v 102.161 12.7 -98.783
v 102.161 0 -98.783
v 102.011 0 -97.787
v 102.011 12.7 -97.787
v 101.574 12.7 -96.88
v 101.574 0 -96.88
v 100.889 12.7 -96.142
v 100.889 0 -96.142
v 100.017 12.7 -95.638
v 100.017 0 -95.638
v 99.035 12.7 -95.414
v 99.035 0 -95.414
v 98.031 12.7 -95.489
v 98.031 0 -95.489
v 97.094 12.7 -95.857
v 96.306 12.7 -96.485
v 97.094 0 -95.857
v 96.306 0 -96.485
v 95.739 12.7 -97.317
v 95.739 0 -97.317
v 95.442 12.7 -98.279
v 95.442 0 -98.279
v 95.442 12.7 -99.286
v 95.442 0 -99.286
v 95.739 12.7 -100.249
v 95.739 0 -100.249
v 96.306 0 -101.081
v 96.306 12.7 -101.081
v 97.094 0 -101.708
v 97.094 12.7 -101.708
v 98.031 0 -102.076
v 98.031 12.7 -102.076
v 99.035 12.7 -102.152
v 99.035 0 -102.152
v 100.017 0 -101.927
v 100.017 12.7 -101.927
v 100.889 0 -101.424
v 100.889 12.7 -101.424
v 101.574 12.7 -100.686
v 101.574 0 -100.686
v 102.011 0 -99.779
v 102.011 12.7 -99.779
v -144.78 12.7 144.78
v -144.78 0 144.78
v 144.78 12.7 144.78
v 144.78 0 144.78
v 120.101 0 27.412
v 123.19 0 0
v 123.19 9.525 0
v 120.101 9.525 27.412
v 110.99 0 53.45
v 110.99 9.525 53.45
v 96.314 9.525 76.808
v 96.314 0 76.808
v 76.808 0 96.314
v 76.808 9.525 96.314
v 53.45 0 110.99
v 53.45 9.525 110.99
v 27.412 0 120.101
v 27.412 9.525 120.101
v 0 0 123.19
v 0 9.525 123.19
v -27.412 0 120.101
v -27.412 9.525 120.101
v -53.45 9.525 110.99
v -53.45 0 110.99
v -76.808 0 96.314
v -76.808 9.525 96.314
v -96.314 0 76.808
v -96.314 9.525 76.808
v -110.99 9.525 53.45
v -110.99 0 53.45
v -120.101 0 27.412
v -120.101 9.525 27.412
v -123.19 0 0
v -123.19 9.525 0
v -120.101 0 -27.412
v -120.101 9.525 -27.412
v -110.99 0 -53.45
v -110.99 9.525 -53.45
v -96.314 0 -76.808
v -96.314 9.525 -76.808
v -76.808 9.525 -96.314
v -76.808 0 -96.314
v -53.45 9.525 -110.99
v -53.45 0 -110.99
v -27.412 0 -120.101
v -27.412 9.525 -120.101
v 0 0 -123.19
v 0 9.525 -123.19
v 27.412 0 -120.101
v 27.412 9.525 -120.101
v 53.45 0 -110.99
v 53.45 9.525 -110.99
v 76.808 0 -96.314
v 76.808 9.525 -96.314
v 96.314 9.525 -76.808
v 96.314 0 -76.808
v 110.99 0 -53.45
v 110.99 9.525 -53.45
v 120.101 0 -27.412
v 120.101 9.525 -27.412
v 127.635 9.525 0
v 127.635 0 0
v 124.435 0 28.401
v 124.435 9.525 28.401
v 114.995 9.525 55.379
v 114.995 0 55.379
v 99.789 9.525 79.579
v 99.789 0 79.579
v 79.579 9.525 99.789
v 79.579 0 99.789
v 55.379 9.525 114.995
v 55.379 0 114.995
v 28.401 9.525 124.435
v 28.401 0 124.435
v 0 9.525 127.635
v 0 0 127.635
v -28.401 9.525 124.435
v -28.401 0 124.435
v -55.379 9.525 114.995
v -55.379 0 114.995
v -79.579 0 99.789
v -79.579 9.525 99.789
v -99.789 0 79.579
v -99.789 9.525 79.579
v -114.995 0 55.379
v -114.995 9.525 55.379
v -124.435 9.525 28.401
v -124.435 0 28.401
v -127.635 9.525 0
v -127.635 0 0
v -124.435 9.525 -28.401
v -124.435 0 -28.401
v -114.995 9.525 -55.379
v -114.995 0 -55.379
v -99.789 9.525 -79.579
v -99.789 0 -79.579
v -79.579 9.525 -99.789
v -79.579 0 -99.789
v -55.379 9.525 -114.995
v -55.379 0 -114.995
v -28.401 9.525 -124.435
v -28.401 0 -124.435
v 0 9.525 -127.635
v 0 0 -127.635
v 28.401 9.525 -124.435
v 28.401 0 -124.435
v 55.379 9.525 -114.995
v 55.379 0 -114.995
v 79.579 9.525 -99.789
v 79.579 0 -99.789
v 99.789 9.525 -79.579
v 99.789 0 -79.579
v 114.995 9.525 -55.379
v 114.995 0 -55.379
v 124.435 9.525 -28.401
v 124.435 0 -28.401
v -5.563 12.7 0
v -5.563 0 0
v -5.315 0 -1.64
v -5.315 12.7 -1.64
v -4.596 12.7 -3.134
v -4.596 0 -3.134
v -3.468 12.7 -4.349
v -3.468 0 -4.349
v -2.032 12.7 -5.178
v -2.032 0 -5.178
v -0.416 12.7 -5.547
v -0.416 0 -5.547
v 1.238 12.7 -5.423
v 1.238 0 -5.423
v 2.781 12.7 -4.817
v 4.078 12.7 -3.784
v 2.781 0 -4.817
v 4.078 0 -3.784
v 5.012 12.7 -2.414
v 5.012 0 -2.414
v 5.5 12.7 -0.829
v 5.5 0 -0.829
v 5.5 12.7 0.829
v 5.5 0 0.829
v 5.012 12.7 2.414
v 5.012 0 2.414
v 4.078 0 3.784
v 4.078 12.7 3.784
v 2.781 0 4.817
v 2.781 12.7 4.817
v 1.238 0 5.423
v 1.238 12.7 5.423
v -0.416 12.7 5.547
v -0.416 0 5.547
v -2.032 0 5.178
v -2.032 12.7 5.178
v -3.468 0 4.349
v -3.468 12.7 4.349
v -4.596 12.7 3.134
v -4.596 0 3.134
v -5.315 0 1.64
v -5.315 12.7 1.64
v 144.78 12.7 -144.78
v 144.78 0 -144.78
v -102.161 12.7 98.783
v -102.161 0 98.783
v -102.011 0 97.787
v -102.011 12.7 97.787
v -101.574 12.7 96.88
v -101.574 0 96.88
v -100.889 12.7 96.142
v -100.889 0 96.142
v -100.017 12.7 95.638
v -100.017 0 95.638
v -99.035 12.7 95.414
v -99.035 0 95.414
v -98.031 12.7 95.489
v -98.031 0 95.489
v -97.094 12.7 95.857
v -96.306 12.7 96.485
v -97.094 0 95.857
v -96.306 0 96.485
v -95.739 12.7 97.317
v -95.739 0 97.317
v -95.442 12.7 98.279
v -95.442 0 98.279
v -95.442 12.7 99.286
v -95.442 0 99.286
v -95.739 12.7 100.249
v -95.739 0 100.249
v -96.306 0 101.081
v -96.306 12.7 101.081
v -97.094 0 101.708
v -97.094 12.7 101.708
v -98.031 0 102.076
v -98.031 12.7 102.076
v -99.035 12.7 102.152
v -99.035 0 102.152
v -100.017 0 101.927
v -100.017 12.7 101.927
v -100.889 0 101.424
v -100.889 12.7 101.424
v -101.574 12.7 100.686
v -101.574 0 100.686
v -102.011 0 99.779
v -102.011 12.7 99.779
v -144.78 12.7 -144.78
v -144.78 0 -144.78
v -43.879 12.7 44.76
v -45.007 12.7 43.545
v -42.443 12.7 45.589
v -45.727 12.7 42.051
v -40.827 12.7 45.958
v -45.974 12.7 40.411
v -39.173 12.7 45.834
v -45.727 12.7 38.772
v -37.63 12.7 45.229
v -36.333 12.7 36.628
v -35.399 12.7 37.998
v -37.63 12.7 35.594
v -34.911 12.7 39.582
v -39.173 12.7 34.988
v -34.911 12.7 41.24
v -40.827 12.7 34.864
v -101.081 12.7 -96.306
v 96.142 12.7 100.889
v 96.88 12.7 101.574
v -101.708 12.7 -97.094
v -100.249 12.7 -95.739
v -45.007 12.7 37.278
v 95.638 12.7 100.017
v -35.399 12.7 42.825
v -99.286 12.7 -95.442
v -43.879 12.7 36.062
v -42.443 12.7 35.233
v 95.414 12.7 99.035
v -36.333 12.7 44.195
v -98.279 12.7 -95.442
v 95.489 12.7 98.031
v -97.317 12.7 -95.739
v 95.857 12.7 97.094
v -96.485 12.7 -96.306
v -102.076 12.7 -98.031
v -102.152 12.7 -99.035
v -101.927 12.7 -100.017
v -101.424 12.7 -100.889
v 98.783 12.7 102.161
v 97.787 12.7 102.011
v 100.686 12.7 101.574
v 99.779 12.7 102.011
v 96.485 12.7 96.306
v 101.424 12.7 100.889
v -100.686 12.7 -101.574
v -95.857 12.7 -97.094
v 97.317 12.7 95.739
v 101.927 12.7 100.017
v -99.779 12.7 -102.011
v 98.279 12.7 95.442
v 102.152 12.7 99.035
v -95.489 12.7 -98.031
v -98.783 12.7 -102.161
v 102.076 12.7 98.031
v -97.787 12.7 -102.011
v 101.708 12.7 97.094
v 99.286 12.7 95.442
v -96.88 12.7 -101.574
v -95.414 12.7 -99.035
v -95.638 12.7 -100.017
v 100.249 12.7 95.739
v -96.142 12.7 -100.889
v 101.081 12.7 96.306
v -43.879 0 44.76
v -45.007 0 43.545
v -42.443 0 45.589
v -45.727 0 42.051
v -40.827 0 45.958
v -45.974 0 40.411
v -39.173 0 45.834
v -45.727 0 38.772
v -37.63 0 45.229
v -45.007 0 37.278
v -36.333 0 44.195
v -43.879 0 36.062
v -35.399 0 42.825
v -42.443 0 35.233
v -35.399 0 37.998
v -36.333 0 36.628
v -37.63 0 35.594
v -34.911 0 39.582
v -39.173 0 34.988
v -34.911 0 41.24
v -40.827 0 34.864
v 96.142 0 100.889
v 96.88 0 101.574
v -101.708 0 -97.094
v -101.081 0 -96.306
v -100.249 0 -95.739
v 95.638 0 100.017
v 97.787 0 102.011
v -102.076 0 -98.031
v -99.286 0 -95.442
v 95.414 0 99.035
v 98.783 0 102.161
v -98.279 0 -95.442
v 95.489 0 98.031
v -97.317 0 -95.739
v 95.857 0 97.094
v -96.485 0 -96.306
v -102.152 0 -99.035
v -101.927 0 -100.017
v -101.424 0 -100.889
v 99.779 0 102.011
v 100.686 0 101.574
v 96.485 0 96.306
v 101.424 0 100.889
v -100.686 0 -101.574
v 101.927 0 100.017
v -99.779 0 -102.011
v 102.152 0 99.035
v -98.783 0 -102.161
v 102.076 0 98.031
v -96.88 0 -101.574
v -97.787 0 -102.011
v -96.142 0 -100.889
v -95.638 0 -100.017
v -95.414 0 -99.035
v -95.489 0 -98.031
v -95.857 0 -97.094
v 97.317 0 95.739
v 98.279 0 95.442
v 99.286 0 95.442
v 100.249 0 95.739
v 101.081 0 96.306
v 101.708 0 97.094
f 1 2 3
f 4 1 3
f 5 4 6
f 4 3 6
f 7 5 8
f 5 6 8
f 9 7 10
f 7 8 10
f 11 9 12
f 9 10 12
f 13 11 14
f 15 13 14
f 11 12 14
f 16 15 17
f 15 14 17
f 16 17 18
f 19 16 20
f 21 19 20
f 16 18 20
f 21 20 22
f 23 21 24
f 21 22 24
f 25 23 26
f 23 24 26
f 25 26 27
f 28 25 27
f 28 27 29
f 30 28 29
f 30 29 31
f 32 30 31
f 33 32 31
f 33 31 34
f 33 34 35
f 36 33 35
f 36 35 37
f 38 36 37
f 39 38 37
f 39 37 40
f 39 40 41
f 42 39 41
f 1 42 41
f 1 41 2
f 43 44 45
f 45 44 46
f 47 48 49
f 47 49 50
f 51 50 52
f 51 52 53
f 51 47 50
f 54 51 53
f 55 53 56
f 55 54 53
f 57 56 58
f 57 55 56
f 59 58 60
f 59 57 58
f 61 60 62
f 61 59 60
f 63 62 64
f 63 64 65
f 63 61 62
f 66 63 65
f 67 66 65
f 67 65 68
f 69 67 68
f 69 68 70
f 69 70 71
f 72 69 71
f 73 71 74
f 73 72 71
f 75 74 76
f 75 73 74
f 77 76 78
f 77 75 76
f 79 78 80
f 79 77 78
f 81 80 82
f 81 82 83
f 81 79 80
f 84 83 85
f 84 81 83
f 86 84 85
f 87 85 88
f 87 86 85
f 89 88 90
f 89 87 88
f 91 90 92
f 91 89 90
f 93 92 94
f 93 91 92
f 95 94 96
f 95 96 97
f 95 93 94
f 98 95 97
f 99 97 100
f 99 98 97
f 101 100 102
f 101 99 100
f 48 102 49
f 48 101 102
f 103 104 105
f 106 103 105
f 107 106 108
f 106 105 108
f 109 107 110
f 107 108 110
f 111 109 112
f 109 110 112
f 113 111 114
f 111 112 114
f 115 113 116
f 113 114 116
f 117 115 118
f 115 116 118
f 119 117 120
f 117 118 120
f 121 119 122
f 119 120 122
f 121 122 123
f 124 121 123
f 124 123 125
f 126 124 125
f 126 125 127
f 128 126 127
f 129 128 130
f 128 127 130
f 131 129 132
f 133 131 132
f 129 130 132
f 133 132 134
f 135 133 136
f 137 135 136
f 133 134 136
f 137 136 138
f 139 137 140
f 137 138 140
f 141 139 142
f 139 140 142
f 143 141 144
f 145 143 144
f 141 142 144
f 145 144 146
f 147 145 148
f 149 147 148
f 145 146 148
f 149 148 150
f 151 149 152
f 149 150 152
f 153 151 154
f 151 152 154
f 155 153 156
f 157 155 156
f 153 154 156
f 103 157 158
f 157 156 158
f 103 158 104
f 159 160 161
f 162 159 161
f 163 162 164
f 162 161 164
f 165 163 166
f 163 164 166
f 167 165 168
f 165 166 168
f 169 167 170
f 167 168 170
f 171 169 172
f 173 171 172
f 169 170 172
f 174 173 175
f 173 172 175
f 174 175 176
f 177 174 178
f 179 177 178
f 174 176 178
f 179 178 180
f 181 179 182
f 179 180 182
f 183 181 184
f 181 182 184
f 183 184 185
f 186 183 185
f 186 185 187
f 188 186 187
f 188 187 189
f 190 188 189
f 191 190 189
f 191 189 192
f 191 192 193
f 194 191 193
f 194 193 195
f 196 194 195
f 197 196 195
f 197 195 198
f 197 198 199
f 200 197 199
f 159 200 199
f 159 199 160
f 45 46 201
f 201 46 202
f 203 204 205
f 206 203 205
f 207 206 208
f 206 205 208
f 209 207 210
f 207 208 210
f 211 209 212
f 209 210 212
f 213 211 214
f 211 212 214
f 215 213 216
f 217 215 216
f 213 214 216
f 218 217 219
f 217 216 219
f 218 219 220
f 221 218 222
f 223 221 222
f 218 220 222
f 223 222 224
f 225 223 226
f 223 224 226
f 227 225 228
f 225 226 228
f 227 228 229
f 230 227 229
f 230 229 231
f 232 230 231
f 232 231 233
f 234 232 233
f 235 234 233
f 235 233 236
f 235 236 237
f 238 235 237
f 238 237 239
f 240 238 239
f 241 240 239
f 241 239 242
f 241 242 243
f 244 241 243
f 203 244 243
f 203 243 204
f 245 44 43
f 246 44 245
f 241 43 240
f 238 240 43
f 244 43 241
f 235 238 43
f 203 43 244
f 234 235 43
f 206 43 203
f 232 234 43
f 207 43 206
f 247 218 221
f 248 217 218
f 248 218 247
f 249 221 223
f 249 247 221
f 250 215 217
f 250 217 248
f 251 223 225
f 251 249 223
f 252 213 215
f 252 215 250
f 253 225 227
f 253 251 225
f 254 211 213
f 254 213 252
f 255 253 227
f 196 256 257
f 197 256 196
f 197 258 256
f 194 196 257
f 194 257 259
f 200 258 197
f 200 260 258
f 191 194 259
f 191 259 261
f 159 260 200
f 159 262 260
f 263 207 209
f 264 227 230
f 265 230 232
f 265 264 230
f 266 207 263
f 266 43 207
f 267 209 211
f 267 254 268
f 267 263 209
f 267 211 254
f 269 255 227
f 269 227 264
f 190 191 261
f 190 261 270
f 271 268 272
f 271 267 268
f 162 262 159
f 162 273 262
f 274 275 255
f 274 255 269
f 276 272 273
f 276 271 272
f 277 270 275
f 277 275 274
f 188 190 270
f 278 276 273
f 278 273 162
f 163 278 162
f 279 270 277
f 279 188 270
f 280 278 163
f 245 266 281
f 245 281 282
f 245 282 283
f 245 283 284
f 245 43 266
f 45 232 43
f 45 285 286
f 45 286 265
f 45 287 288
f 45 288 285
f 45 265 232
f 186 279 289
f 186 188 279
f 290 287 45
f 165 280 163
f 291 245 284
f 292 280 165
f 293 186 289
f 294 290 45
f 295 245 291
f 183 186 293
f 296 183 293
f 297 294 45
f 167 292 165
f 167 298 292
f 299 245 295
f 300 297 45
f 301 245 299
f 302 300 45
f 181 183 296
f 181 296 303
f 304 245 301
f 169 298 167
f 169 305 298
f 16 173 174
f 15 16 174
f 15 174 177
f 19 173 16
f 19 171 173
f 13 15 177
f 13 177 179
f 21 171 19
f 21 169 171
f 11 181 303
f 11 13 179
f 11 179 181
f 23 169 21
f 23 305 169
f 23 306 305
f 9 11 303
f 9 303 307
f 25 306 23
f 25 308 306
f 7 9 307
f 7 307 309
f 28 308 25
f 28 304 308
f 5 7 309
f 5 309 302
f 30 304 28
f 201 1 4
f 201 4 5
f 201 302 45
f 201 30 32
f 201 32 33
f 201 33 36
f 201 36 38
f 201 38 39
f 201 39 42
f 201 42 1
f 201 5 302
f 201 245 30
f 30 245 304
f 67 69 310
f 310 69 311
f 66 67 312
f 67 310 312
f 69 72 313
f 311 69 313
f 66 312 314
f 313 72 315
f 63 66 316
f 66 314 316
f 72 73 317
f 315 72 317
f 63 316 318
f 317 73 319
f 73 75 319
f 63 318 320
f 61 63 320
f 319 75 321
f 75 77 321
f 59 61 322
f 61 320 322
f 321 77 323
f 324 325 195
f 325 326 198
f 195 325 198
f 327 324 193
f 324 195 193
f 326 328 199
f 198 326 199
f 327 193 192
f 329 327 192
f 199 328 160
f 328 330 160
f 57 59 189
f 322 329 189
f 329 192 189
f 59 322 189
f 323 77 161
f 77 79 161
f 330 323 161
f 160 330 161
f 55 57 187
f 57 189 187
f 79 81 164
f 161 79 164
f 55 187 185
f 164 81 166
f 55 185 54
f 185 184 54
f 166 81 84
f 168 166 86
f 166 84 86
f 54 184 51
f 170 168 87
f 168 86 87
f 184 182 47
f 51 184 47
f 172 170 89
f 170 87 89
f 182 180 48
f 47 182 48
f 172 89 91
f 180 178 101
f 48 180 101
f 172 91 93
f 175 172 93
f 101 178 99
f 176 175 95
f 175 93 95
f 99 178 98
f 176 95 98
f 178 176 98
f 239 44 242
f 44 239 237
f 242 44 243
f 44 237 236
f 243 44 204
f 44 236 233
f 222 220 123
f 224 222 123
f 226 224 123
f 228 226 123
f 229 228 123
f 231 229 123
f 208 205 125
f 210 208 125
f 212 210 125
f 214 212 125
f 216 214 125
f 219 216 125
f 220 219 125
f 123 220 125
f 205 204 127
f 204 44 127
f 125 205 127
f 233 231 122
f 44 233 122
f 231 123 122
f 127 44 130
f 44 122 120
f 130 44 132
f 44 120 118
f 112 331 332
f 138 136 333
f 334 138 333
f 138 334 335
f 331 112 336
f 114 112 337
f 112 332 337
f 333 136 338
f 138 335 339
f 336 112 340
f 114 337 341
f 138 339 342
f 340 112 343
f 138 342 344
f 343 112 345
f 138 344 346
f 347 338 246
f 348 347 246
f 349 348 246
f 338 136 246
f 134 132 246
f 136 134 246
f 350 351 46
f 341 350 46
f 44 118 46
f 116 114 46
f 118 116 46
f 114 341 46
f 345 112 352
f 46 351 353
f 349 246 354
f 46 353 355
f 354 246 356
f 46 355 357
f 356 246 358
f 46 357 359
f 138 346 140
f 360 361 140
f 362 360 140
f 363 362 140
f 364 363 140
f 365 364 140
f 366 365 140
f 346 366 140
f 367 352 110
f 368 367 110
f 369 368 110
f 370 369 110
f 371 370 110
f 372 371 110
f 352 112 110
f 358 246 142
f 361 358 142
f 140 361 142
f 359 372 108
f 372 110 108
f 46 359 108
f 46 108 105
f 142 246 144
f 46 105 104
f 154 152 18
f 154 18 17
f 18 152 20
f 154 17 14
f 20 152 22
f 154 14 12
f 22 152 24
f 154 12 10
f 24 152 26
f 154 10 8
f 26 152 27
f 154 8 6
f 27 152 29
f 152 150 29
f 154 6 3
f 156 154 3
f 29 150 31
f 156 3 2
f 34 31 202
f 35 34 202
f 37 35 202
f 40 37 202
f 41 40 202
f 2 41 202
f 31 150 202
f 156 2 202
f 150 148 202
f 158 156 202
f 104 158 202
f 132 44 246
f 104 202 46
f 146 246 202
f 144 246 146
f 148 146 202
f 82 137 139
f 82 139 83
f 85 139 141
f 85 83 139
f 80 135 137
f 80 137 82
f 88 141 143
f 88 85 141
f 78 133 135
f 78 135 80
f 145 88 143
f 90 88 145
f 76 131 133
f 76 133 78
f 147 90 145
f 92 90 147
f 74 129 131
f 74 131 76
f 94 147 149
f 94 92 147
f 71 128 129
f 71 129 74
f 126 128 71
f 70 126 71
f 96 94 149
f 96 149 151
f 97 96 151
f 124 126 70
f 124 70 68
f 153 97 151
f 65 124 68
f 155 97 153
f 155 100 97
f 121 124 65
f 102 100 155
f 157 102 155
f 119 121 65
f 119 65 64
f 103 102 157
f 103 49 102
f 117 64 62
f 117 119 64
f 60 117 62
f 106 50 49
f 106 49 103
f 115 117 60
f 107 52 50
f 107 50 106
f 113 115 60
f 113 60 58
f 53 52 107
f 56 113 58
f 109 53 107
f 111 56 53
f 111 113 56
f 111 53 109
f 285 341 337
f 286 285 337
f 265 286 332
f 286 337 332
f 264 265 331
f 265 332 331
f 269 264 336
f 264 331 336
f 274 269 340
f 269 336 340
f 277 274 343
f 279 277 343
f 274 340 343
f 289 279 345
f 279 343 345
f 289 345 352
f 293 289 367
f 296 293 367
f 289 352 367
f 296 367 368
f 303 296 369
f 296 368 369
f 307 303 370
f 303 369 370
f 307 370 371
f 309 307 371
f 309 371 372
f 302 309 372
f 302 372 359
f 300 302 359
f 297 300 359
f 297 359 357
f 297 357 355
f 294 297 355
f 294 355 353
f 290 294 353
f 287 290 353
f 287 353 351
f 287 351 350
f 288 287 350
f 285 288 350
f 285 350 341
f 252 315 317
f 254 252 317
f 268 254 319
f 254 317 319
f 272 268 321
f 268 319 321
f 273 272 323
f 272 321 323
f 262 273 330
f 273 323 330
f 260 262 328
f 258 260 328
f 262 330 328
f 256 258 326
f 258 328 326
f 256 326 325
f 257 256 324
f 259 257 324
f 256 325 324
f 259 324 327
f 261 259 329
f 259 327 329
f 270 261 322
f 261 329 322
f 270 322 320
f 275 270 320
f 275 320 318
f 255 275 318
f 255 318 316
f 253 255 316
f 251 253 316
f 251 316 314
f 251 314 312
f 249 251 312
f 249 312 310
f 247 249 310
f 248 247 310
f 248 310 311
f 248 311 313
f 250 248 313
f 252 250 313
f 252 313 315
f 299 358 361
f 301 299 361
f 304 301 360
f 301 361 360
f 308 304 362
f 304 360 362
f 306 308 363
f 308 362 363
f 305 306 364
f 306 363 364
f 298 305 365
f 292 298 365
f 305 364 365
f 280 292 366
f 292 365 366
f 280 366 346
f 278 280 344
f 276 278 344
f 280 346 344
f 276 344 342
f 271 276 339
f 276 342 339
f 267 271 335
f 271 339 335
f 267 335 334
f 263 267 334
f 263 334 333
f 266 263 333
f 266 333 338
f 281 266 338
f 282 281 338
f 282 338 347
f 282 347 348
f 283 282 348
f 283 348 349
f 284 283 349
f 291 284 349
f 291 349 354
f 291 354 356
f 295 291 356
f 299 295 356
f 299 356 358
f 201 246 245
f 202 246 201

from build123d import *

# Parameters (mm, degrees)
SKETCH1_W                     = 289.56
SKETCH1_H                     = 289.56
BOSS_EXTRUDE1_DEPTH           = 12.7
PIPE_TAP_DRILL_FOR_1_4_TAP2_D = 11.1252
PIPE_TAP_DRILL_FOR_1_4_TAP1_D = 11.1252
F_1_4_CLEARANCE_HOLE1_D       = 6.7564
SKETCH12_R                    = 127.635
SKETCH12_R_2                  = 123.19
CUT_EXTRUDE1_DEPTH            = 9.525
CIRPATTERN1_COUNT             = 4


with BuildPart() as part:
    # Sketch1 → Boss-Extrude1 (new body)
    with BuildSketch(Plane(origin=(0, 0, 0), x_dir=(1, 0, 0), z_dir=(0, 1, 0))):
        Rectangle(SKETCH1_W, SKETCH1_H)
    extrude(amount=BOSS_EXTRUDE1_DEPTH)

    # Pipe Tap Drill for 1/4 Tap2 (through all)
    with Locations(Plane(origin=(0, 12.7, 0), x_dir=(1, 0, 0), z_dir=(0, 1, 0))):
        with Locations((0, 0)):
            Hole(PIPE_TAP_DRILL_FOR_1_4_TAP2_D / 2)

    # Pipe Tap Drill for 1/4 Tap1 (through all)
    with Locations(Plane(origin=(0, 12.7, 0), x_dir=(1, 0, 0), z_dir=(0, 1, 0))):
        with Locations((-40.411152545, -40.411152545)):
            Hole(PIPE_TAP_DRILL_FOR_1_4_TAP1_D / 2)

    # 1/4 Clearance Hole1 (through all)
    with Locations(Plane(origin=(0, 12.7, 0), x_dir=(1, 0, 0), z_dir=(0, 1, 0))):
        with Locations((-98.782817332, -98.782817332)):
            f_1_4_clearance_hole1 = Hole(F_1_4_CLEARANCE_HOLE1_D / 2)

    # Sketch12 → Cut-Extrude1 (cut)
    with BuildSketch(Plane.XZ):
        Circle(SKETCH12_R)
        Circle(SKETCH12_R_2, mode=Mode.SUBTRACT)
    extrude(amount=-CUT_EXTRUDE1_DEPTH, mode=Mode.SUBTRACT)

    # CirPattern1: 1/4 Clearance Hole1 ×4 about axis
    cirpattern1_axis = Axis((0, 0, 0), (0, 1, 0))
    for i in range(1, CIRPATTERN1_COUNT):
        add(f_1_4_clearance_hole1.rotate(cirpattern1_axis, i * 360 / CIRPATTERN1_COUNT), mode=Mode.SUBTRACT)


solid = part.part
